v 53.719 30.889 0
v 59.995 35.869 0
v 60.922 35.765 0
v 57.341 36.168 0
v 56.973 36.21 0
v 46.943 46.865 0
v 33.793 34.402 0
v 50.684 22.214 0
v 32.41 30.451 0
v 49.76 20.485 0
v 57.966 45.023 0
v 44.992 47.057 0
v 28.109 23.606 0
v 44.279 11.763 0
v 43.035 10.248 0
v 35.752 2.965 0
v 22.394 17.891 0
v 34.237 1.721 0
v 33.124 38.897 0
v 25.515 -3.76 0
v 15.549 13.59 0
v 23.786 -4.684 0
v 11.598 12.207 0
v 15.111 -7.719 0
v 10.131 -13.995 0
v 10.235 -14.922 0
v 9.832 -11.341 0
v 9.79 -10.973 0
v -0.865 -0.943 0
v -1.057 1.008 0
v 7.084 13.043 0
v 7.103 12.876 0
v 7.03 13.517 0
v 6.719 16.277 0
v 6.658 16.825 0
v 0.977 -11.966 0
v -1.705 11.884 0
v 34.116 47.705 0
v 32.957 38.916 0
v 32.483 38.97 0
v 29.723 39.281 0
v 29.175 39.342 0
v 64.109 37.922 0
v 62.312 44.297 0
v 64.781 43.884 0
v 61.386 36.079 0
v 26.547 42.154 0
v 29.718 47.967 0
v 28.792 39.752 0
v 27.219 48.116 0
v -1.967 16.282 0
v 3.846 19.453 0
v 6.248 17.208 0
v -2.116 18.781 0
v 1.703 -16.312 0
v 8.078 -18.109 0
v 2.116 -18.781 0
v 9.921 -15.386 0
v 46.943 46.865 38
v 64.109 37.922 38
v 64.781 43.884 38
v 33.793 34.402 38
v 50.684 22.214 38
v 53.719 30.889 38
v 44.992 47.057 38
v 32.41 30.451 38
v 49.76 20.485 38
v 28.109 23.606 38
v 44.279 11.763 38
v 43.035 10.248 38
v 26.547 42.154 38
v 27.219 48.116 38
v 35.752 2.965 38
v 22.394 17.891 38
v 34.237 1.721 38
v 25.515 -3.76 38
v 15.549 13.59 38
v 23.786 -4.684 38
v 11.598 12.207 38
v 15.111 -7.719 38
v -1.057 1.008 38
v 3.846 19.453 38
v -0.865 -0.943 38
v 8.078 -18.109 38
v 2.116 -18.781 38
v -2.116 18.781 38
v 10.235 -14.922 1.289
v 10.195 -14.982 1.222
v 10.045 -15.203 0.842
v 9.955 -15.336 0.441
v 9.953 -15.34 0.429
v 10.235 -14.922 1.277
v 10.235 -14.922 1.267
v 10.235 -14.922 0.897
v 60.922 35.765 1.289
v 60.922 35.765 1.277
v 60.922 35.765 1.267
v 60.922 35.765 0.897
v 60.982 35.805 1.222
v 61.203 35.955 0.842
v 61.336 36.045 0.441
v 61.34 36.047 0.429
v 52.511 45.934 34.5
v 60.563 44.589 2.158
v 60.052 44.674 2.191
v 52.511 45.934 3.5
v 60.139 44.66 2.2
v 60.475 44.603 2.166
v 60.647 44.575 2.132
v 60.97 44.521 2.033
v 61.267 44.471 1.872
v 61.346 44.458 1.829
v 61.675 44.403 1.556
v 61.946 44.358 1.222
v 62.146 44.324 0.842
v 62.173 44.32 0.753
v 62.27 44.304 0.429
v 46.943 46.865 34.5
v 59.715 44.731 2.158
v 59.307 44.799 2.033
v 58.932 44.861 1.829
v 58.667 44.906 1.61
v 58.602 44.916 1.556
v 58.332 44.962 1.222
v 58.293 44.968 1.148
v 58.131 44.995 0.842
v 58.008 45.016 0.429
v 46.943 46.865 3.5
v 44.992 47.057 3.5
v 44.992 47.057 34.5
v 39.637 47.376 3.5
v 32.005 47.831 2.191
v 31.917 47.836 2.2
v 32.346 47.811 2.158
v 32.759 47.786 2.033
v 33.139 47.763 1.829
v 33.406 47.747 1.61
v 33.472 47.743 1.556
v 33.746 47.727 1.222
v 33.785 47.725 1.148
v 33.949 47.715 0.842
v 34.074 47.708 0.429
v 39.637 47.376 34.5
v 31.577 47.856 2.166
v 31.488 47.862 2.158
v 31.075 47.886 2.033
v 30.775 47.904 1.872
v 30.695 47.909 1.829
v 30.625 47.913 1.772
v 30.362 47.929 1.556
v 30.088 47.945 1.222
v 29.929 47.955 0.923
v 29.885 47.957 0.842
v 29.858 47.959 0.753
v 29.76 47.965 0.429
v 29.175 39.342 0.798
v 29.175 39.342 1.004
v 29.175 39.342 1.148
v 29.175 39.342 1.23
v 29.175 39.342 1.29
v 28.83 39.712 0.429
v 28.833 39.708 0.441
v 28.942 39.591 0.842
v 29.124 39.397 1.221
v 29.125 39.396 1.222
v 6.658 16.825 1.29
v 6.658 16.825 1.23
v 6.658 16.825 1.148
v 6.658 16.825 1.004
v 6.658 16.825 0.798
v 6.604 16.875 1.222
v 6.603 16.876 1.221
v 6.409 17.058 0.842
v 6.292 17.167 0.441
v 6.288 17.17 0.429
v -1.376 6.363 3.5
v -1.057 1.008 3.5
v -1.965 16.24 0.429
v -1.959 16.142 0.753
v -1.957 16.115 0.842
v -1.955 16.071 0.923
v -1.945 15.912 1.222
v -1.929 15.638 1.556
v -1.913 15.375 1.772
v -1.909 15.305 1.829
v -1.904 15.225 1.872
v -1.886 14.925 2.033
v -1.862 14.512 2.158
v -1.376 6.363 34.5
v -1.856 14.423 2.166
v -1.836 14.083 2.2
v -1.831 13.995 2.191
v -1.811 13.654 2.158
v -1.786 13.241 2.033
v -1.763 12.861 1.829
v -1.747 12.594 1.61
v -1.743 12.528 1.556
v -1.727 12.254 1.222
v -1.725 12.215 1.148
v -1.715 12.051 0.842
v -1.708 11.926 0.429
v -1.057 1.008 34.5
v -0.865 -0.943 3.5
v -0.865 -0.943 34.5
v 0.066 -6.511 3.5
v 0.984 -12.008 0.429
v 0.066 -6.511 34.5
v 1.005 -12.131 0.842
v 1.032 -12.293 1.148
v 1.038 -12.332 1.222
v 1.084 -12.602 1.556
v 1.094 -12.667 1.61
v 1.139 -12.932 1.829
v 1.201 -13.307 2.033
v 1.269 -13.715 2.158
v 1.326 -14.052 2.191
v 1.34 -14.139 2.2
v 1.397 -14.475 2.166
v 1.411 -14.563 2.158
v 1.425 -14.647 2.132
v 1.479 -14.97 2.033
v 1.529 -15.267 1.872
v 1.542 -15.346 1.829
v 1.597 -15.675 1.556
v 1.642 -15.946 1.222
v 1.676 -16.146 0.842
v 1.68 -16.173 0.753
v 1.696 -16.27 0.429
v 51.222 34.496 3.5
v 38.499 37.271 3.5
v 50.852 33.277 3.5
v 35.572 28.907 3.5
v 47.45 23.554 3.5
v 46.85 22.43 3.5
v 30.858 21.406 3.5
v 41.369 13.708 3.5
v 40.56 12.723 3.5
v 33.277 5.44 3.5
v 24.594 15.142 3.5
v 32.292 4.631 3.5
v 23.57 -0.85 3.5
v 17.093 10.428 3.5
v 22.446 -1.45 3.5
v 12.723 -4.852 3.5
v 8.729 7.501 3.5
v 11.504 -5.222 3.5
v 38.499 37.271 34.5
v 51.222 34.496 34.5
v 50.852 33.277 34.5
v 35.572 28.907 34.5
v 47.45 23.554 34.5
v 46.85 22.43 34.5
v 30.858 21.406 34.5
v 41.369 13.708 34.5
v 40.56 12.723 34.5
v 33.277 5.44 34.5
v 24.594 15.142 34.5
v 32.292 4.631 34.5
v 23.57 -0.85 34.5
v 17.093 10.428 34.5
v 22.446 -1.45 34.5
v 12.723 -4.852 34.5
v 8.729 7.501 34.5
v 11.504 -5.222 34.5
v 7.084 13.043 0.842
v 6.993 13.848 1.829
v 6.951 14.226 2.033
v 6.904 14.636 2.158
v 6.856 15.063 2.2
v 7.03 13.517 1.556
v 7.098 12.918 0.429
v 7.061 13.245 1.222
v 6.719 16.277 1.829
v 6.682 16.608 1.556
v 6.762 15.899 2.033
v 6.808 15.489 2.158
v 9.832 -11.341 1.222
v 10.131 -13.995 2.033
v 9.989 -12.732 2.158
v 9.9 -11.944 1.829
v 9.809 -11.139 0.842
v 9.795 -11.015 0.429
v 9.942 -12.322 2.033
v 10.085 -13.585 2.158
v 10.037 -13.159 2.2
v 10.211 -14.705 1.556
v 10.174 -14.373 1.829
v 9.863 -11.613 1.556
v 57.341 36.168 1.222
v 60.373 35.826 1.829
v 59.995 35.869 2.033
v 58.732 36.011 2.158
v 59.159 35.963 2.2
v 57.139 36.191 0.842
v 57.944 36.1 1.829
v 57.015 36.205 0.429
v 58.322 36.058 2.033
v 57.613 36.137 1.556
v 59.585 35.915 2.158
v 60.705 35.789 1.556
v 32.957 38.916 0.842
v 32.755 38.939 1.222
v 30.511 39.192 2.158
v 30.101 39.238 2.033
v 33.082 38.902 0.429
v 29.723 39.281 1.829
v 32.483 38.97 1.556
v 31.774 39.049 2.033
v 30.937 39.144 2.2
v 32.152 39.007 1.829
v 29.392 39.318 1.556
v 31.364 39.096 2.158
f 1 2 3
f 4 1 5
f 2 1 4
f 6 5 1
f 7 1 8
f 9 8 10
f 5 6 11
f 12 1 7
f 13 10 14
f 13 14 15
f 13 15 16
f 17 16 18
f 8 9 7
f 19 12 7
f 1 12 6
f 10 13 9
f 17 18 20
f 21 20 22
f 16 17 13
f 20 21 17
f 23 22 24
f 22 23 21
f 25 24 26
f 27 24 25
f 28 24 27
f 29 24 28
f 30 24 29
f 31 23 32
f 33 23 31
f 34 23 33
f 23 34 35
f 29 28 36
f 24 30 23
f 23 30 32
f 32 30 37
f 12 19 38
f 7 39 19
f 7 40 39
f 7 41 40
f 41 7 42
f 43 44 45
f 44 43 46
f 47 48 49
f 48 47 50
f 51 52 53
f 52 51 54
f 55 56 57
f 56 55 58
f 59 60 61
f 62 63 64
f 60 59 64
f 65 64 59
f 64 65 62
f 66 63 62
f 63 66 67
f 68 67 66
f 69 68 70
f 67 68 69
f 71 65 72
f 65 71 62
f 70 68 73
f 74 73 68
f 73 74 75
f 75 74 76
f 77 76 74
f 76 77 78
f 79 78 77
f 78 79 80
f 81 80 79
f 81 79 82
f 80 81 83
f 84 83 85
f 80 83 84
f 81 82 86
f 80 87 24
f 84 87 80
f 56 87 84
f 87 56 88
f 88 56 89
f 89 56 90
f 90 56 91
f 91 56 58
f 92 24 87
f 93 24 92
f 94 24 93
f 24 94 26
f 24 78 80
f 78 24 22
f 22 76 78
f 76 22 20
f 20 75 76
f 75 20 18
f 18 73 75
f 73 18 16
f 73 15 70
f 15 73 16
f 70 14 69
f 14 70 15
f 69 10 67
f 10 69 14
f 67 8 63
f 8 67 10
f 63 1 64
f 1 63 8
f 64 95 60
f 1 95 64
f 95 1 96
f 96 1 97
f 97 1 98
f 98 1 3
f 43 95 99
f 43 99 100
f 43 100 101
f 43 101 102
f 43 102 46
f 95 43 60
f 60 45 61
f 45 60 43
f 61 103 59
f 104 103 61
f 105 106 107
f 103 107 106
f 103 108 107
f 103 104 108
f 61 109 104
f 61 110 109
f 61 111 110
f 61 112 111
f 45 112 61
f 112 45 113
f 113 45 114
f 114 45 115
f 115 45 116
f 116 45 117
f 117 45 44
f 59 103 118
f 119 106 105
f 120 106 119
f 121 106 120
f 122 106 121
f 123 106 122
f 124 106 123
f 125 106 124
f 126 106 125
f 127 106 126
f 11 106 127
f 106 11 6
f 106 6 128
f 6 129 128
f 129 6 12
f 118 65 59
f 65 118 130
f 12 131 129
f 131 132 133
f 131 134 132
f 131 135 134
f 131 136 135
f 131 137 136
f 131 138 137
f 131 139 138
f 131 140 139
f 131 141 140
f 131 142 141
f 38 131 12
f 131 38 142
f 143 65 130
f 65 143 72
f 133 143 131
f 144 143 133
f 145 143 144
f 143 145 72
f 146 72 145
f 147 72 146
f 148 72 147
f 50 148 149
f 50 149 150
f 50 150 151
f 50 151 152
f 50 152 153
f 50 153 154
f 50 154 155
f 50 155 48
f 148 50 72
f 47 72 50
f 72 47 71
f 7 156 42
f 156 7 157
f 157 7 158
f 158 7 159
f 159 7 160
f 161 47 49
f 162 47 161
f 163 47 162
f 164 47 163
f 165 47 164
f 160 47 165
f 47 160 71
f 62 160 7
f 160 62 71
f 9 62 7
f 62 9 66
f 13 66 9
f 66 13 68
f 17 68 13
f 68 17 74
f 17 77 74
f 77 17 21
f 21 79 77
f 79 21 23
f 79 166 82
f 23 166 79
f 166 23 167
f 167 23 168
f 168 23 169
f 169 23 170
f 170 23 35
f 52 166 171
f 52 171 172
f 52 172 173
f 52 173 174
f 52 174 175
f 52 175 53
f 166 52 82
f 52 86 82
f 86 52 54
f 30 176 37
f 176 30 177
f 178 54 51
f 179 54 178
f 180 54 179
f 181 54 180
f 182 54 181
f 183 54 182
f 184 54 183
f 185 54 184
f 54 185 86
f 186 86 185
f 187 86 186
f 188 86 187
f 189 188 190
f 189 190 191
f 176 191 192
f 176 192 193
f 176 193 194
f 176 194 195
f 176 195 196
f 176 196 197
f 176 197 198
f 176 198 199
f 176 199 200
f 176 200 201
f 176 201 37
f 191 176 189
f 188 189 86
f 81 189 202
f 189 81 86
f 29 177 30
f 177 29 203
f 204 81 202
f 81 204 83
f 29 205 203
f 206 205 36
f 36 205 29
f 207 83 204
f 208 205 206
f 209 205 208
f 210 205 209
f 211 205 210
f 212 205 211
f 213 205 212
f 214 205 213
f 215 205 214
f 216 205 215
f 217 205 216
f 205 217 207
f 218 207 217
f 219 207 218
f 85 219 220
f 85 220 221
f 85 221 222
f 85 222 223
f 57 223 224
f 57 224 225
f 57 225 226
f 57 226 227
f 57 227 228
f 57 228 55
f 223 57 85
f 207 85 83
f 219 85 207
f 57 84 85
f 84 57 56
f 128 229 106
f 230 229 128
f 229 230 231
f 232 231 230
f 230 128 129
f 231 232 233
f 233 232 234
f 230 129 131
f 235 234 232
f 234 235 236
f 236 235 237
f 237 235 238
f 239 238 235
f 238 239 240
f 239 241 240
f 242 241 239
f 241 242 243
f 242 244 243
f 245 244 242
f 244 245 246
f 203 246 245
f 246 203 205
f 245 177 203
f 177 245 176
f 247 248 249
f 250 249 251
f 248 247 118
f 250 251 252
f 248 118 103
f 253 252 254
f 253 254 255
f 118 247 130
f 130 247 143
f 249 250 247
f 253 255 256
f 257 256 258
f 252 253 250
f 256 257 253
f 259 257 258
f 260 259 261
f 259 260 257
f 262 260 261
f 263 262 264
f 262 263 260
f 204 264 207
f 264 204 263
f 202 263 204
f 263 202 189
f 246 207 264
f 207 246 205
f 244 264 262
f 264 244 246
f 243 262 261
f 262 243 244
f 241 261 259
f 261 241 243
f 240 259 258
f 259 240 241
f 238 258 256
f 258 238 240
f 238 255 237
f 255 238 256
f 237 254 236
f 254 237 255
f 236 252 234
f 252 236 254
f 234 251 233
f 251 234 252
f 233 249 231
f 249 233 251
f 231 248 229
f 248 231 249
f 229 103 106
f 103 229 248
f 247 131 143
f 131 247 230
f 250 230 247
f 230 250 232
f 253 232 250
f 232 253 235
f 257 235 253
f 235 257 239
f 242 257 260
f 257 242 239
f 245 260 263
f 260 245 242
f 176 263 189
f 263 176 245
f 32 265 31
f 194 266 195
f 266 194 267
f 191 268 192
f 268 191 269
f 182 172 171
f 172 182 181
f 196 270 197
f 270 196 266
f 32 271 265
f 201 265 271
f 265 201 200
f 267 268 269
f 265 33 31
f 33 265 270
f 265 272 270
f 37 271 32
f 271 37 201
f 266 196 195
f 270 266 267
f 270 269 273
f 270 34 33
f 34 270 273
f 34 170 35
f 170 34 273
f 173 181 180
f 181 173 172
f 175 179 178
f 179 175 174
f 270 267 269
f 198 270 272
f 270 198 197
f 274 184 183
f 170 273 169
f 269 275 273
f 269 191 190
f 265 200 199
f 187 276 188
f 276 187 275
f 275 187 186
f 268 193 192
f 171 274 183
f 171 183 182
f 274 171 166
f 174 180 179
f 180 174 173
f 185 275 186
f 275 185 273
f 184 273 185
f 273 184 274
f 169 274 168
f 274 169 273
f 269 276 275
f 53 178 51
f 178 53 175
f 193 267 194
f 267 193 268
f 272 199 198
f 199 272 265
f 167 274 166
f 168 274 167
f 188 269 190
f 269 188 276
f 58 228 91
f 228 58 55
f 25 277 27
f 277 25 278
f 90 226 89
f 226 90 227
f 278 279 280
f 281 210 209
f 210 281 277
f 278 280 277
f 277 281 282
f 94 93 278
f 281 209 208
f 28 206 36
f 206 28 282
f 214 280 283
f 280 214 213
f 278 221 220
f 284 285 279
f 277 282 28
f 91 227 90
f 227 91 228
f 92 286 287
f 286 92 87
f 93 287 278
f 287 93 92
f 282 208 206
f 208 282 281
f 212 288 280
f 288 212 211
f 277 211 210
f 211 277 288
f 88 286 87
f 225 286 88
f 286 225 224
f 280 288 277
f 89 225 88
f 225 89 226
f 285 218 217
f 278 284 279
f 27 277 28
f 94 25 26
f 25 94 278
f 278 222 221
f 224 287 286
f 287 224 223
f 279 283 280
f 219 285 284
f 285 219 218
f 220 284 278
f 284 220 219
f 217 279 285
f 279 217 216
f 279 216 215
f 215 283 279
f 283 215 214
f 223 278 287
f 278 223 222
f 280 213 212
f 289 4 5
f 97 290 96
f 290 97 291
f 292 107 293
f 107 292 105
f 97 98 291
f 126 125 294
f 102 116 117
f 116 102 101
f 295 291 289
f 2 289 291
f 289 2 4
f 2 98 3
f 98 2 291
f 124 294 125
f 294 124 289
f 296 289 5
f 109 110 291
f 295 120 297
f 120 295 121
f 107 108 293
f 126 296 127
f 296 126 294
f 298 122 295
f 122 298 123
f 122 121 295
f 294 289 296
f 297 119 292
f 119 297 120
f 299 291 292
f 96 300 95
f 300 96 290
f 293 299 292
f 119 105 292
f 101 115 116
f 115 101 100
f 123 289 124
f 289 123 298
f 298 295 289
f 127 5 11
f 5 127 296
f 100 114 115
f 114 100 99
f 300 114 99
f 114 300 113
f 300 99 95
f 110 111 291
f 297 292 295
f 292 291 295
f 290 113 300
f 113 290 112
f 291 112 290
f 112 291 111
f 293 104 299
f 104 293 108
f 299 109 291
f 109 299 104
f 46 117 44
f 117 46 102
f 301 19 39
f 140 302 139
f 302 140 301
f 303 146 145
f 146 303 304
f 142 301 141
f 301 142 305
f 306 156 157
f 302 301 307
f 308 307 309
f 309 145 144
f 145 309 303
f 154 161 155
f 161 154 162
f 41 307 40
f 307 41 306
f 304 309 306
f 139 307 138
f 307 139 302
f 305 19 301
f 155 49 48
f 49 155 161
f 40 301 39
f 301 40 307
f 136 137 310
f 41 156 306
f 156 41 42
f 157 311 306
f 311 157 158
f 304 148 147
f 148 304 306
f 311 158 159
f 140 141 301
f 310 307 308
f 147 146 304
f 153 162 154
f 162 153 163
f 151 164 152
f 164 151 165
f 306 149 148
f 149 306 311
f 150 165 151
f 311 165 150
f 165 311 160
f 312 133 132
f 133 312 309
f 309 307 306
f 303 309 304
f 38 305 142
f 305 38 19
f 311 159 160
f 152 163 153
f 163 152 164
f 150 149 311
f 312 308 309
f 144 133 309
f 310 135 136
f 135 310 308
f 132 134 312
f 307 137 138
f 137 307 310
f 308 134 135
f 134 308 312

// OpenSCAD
$fn = 32;

// ----------------------------------------------------------------------
// Air duct: 20 mm duct, 3.5 mm wall, 38 mm across
// ----------------------------------------------------------------------

// --- parameters (mm) ---
duct_r = 10;              // duct core radius
duct_d = 20;              // duct core diameter
wall = 3.5;               // duct wall thickness
height = 38;              // duct width (extrusion height)
port_r = 18.9;            // port flange half width
port_d = 37.8;            // port flange width
port_t = 6;               // port flange thickness
bolt_d = 4.4;             // port bolt holes
bolt_offset = 14.2;       // bolt hole offset from the port axis

difference() {
  /* outer hull chain: tube with a flat flange plate at every port */
  linear_extrude(height = 38) {
    hull() {
      polygon([[2.116, -18.781], [-2.116, 18.781], [3.846, 19.453], [8.078, -18.109]]);
      translate([8.943, 1.008]) circle(r = 10);
    }
    hull() {
      translate([8.943, 1.008]) circle(r = 10);
      translate([10.236, 1.153]) circle(r = 10);
    }
    hull() {
      translate([10.236, 1.153]) circle(r = 10);
      translate([19.959, 4.555]) circle(r = 10);
    }
    hull() {
      translate([19.959, 4.555]) circle(r = 10);
      translate([28.681, 10.036]) circle(r = 10);
    }
    hull() {
      translate([28.681, 10.036]) circle(r = 10);
      translate([35.964, 17.319]) circle(r = 10);
    }
    hull() {
      translate([35.964, 17.319]) circle(r = 10);
      translate([41.445, 26.041]) circle(r = 10);
    }
    hull() {
      translate([41.445, 26.041]) circle(r = 10);
      translate([44.847, 35.764]) circle(r = 10);
    }
    hull() {
      translate([44.847, 35.764]) circle(r = 10);
      translate([44.992, 37.057]) circle(r = 10);
    }
    hull() {
      translate([44.992, 37.057]) circle(r = 10);
      polygon([[27.219, 48.116], [64.781, 43.884], [64.109, 37.922], [26.547, 42.154]]);
    }
  }
  /* air passage: the same chain inset by the wall, 5 mm proud of the ports */
  translate([0, 0, 3.5]) linear_extrude(height = 31) {
    hull() {
      translate([-4.969, -0.56]) circle(r = 6.5);
      translate([10.236, 1.153]) circle(r = 6.5);
    }
    hull() {
      translate([10.236, 1.153]) circle(r = 6.5);
      translate([19.959, 4.555]) circle(r = 6.5);
    }
    hull() {
      translate([19.959, 4.555]) circle(r = 6.5);
      translate([28.681, 10.036]) circle(r = 6.5);
    }
    hull() {
      translate([28.681, 10.036]) circle(r = 6.5);
      translate([35.964, 17.319]) circle(r = 6.5);
    }
    hull() {
      translate([35.964, 17.319]) circle(r = 6.5);
      translate([41.445, 26.041]) circle(r = 6.5);
    }
    hull() {
      translate([41.445, 26.041]) circle(r = 6.5);
      translate([44.847, 35.764]) circle(r = 6.5);
    }
    hull() {
      translate([44.847, 35.764]) circle(r = 6.5);
      translate([46.56, 50.969]) circle(r = 6.5);
    }
  }
  translate([0, 0]) rotate([0, 0, -83.57]) translate([-14.2, -2.5]) rotate([-90, 0, 0]) cylinder(h = 11, d = 4.4);
  translate([0, 0]) rotate([0, 0, -83.57]) translate([14.2, -2.5]) rotate([-90, 0, 0]) cylinder(h = 11, d = 4.4);
  translate([46, 46]) rotate([0, 0, 173.57]) translate([-14.2, -2.5]) rotate([-90, 0, 0]) cylinder(h = 11, d = 4.4);
  translate([46, 46]) rotate([0, 0, 173.57]) translate([14.2, -2.5]) rotate([-90, 0, 0]) cylinder(h = 11, d = 4.4);
}
